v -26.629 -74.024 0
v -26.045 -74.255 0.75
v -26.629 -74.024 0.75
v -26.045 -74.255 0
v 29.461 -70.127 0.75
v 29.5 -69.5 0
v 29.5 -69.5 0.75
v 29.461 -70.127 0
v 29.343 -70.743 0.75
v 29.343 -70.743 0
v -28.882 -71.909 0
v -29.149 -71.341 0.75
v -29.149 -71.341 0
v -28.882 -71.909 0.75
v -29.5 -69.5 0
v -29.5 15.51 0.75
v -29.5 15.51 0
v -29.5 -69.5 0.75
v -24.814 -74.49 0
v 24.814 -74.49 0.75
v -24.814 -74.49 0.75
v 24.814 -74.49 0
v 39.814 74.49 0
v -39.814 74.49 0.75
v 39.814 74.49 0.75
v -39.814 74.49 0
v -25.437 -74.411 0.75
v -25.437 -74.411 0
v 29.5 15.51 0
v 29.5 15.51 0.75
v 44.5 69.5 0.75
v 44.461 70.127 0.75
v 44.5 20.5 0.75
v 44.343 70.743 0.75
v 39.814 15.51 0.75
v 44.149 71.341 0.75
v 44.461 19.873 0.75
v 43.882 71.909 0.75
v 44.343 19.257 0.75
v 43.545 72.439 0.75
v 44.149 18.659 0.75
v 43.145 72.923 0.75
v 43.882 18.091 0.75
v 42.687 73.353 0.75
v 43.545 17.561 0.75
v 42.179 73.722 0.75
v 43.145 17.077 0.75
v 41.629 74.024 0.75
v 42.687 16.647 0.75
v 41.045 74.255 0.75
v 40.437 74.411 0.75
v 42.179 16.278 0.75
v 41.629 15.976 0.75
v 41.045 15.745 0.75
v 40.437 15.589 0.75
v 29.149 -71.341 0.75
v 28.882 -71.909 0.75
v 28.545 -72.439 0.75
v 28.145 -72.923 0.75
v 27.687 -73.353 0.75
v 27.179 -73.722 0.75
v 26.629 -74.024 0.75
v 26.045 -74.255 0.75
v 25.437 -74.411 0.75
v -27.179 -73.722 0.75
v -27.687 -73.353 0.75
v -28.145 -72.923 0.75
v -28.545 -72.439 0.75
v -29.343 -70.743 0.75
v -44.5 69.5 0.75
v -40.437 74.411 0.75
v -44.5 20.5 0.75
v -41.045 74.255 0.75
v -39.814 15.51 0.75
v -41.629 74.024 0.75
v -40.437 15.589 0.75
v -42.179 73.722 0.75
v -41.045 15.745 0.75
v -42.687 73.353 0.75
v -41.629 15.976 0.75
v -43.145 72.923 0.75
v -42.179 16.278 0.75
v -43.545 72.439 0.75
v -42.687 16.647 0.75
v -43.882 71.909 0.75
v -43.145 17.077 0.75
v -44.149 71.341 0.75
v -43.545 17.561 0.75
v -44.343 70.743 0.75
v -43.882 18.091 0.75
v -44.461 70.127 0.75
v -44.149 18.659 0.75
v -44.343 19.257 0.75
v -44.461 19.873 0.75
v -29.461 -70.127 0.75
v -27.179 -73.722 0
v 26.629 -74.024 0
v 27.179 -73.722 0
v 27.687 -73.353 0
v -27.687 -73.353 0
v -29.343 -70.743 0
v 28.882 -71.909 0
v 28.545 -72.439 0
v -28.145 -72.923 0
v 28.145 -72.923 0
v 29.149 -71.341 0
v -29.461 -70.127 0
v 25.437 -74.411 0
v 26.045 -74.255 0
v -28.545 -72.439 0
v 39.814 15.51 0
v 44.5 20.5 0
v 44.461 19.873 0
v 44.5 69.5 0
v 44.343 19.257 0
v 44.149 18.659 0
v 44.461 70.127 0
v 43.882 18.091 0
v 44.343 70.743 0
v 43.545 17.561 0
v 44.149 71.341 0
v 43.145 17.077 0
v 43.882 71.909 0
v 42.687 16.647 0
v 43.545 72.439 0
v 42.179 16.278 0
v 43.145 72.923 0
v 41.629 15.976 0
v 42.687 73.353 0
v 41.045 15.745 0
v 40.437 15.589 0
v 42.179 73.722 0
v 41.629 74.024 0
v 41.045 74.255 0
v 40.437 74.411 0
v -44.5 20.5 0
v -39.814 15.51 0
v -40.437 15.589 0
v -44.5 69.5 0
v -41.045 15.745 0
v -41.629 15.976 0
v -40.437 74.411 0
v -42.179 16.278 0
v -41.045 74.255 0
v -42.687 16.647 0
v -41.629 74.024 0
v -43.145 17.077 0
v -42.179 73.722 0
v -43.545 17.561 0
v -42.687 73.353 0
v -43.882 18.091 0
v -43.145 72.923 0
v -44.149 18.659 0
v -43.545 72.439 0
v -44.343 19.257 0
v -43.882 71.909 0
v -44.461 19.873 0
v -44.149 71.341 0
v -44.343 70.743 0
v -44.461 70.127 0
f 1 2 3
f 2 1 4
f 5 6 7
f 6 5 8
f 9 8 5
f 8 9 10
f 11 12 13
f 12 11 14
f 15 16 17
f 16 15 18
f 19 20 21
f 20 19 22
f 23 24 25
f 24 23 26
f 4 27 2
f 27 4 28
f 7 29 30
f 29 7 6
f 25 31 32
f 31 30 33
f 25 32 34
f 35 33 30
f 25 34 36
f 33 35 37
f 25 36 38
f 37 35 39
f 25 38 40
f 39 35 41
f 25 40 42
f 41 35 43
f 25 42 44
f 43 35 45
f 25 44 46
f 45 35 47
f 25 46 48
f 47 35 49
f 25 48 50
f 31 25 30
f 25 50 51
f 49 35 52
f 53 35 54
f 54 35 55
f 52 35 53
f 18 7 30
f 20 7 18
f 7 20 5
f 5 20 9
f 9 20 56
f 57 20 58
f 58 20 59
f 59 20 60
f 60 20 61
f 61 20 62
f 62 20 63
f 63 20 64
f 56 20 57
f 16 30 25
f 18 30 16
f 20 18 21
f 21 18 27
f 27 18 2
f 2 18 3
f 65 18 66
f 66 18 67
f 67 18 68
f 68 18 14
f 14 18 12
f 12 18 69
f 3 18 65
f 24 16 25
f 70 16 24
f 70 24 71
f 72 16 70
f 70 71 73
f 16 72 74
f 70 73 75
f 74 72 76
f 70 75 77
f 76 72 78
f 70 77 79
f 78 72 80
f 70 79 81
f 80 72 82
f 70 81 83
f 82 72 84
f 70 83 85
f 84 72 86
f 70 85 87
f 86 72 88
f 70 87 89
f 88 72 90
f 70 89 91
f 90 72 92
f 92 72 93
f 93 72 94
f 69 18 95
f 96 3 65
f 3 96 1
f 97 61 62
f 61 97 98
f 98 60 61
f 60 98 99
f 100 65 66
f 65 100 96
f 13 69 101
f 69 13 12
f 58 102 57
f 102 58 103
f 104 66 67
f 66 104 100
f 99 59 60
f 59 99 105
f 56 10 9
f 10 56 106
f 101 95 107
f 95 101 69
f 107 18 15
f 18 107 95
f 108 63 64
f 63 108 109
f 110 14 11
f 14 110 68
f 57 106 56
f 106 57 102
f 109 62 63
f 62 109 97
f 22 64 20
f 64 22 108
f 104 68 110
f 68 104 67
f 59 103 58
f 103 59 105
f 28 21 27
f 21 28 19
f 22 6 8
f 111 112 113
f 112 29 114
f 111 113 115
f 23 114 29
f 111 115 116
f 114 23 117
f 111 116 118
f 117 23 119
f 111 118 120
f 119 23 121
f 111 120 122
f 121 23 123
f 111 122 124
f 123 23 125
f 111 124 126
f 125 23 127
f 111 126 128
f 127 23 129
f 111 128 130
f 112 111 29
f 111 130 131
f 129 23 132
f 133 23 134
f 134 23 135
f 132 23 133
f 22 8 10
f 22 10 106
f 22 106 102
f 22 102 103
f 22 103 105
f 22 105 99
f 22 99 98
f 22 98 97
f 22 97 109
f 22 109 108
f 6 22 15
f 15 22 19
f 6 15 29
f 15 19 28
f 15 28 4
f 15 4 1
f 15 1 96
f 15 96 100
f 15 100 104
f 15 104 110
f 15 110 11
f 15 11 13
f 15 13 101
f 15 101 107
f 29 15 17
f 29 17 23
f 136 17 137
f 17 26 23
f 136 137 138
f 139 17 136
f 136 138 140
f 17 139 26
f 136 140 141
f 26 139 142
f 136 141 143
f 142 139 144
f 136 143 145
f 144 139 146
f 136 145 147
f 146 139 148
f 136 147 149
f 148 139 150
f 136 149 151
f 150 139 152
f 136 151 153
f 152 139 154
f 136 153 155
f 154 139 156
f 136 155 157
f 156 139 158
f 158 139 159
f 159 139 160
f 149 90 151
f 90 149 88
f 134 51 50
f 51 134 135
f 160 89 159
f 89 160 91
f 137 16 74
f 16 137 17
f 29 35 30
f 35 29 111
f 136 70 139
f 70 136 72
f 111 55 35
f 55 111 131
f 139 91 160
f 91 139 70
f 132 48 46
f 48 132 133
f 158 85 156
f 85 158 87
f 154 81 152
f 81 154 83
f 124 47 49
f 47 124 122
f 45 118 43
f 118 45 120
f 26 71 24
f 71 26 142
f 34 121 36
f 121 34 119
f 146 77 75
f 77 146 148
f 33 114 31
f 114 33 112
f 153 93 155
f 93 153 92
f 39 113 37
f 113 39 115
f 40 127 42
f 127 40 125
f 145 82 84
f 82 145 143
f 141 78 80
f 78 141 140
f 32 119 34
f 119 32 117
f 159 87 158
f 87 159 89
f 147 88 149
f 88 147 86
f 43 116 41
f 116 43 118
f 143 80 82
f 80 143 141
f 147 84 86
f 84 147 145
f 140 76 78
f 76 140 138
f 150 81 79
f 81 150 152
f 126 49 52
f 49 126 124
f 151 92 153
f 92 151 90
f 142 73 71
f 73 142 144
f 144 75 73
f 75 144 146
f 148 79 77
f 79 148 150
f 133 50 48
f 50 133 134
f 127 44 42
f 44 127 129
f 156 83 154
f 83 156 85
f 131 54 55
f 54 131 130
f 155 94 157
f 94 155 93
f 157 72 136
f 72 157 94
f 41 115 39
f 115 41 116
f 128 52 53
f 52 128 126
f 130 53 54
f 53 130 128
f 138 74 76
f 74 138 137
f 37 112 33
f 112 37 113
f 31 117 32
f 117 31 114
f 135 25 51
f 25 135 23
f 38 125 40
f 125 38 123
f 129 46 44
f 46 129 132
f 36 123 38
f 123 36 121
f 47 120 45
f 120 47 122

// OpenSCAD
$fn = 50;


difference() {
	union() {
		hull() {
			translate(v = [-24.5000000000, 69.5000000000, 0]) {
				cylinder(h = 0.7500000000, r = 5);
			}
			translate(v = [24.5000000000, 69.5000000000, 0]) {
				cylinder(h = 0.7500000000, r = 5);
			}
			translate(v = [-24.5000000000, -69.5000000000, 0]) {
				cylinder(h = 0.7500000000, r = 5);
			}
			translate(v = [24.5000000000, -69.5000000000, 0]) {
				cylinder(h = 0.7500000000, r = 5);
			}
		}
		translate(v = [0, 45.0000000000, 0]) {
			hull() {
				translate(v = [-39.5000000000, 24.5000000000, 0]) {
					cylinder(h = 0.7500000000, r = 5);
				}
				translate(v = [39.5000000000, 24.5000000000, 0]) {
					cylinder(h = 0.7500000000, r = 5);
				}
				translate(v = [-39.5000000000, -24.5000000000, 0]) {
					cylinder(h = 0.7500000000, r = 5);
				}
				translate(v = [39.5000000000, -24.5000000000, 0]) {
					cylinder(h = 0.7500000000, r = 5);
				}
			}
		}
	}
	union();
}
